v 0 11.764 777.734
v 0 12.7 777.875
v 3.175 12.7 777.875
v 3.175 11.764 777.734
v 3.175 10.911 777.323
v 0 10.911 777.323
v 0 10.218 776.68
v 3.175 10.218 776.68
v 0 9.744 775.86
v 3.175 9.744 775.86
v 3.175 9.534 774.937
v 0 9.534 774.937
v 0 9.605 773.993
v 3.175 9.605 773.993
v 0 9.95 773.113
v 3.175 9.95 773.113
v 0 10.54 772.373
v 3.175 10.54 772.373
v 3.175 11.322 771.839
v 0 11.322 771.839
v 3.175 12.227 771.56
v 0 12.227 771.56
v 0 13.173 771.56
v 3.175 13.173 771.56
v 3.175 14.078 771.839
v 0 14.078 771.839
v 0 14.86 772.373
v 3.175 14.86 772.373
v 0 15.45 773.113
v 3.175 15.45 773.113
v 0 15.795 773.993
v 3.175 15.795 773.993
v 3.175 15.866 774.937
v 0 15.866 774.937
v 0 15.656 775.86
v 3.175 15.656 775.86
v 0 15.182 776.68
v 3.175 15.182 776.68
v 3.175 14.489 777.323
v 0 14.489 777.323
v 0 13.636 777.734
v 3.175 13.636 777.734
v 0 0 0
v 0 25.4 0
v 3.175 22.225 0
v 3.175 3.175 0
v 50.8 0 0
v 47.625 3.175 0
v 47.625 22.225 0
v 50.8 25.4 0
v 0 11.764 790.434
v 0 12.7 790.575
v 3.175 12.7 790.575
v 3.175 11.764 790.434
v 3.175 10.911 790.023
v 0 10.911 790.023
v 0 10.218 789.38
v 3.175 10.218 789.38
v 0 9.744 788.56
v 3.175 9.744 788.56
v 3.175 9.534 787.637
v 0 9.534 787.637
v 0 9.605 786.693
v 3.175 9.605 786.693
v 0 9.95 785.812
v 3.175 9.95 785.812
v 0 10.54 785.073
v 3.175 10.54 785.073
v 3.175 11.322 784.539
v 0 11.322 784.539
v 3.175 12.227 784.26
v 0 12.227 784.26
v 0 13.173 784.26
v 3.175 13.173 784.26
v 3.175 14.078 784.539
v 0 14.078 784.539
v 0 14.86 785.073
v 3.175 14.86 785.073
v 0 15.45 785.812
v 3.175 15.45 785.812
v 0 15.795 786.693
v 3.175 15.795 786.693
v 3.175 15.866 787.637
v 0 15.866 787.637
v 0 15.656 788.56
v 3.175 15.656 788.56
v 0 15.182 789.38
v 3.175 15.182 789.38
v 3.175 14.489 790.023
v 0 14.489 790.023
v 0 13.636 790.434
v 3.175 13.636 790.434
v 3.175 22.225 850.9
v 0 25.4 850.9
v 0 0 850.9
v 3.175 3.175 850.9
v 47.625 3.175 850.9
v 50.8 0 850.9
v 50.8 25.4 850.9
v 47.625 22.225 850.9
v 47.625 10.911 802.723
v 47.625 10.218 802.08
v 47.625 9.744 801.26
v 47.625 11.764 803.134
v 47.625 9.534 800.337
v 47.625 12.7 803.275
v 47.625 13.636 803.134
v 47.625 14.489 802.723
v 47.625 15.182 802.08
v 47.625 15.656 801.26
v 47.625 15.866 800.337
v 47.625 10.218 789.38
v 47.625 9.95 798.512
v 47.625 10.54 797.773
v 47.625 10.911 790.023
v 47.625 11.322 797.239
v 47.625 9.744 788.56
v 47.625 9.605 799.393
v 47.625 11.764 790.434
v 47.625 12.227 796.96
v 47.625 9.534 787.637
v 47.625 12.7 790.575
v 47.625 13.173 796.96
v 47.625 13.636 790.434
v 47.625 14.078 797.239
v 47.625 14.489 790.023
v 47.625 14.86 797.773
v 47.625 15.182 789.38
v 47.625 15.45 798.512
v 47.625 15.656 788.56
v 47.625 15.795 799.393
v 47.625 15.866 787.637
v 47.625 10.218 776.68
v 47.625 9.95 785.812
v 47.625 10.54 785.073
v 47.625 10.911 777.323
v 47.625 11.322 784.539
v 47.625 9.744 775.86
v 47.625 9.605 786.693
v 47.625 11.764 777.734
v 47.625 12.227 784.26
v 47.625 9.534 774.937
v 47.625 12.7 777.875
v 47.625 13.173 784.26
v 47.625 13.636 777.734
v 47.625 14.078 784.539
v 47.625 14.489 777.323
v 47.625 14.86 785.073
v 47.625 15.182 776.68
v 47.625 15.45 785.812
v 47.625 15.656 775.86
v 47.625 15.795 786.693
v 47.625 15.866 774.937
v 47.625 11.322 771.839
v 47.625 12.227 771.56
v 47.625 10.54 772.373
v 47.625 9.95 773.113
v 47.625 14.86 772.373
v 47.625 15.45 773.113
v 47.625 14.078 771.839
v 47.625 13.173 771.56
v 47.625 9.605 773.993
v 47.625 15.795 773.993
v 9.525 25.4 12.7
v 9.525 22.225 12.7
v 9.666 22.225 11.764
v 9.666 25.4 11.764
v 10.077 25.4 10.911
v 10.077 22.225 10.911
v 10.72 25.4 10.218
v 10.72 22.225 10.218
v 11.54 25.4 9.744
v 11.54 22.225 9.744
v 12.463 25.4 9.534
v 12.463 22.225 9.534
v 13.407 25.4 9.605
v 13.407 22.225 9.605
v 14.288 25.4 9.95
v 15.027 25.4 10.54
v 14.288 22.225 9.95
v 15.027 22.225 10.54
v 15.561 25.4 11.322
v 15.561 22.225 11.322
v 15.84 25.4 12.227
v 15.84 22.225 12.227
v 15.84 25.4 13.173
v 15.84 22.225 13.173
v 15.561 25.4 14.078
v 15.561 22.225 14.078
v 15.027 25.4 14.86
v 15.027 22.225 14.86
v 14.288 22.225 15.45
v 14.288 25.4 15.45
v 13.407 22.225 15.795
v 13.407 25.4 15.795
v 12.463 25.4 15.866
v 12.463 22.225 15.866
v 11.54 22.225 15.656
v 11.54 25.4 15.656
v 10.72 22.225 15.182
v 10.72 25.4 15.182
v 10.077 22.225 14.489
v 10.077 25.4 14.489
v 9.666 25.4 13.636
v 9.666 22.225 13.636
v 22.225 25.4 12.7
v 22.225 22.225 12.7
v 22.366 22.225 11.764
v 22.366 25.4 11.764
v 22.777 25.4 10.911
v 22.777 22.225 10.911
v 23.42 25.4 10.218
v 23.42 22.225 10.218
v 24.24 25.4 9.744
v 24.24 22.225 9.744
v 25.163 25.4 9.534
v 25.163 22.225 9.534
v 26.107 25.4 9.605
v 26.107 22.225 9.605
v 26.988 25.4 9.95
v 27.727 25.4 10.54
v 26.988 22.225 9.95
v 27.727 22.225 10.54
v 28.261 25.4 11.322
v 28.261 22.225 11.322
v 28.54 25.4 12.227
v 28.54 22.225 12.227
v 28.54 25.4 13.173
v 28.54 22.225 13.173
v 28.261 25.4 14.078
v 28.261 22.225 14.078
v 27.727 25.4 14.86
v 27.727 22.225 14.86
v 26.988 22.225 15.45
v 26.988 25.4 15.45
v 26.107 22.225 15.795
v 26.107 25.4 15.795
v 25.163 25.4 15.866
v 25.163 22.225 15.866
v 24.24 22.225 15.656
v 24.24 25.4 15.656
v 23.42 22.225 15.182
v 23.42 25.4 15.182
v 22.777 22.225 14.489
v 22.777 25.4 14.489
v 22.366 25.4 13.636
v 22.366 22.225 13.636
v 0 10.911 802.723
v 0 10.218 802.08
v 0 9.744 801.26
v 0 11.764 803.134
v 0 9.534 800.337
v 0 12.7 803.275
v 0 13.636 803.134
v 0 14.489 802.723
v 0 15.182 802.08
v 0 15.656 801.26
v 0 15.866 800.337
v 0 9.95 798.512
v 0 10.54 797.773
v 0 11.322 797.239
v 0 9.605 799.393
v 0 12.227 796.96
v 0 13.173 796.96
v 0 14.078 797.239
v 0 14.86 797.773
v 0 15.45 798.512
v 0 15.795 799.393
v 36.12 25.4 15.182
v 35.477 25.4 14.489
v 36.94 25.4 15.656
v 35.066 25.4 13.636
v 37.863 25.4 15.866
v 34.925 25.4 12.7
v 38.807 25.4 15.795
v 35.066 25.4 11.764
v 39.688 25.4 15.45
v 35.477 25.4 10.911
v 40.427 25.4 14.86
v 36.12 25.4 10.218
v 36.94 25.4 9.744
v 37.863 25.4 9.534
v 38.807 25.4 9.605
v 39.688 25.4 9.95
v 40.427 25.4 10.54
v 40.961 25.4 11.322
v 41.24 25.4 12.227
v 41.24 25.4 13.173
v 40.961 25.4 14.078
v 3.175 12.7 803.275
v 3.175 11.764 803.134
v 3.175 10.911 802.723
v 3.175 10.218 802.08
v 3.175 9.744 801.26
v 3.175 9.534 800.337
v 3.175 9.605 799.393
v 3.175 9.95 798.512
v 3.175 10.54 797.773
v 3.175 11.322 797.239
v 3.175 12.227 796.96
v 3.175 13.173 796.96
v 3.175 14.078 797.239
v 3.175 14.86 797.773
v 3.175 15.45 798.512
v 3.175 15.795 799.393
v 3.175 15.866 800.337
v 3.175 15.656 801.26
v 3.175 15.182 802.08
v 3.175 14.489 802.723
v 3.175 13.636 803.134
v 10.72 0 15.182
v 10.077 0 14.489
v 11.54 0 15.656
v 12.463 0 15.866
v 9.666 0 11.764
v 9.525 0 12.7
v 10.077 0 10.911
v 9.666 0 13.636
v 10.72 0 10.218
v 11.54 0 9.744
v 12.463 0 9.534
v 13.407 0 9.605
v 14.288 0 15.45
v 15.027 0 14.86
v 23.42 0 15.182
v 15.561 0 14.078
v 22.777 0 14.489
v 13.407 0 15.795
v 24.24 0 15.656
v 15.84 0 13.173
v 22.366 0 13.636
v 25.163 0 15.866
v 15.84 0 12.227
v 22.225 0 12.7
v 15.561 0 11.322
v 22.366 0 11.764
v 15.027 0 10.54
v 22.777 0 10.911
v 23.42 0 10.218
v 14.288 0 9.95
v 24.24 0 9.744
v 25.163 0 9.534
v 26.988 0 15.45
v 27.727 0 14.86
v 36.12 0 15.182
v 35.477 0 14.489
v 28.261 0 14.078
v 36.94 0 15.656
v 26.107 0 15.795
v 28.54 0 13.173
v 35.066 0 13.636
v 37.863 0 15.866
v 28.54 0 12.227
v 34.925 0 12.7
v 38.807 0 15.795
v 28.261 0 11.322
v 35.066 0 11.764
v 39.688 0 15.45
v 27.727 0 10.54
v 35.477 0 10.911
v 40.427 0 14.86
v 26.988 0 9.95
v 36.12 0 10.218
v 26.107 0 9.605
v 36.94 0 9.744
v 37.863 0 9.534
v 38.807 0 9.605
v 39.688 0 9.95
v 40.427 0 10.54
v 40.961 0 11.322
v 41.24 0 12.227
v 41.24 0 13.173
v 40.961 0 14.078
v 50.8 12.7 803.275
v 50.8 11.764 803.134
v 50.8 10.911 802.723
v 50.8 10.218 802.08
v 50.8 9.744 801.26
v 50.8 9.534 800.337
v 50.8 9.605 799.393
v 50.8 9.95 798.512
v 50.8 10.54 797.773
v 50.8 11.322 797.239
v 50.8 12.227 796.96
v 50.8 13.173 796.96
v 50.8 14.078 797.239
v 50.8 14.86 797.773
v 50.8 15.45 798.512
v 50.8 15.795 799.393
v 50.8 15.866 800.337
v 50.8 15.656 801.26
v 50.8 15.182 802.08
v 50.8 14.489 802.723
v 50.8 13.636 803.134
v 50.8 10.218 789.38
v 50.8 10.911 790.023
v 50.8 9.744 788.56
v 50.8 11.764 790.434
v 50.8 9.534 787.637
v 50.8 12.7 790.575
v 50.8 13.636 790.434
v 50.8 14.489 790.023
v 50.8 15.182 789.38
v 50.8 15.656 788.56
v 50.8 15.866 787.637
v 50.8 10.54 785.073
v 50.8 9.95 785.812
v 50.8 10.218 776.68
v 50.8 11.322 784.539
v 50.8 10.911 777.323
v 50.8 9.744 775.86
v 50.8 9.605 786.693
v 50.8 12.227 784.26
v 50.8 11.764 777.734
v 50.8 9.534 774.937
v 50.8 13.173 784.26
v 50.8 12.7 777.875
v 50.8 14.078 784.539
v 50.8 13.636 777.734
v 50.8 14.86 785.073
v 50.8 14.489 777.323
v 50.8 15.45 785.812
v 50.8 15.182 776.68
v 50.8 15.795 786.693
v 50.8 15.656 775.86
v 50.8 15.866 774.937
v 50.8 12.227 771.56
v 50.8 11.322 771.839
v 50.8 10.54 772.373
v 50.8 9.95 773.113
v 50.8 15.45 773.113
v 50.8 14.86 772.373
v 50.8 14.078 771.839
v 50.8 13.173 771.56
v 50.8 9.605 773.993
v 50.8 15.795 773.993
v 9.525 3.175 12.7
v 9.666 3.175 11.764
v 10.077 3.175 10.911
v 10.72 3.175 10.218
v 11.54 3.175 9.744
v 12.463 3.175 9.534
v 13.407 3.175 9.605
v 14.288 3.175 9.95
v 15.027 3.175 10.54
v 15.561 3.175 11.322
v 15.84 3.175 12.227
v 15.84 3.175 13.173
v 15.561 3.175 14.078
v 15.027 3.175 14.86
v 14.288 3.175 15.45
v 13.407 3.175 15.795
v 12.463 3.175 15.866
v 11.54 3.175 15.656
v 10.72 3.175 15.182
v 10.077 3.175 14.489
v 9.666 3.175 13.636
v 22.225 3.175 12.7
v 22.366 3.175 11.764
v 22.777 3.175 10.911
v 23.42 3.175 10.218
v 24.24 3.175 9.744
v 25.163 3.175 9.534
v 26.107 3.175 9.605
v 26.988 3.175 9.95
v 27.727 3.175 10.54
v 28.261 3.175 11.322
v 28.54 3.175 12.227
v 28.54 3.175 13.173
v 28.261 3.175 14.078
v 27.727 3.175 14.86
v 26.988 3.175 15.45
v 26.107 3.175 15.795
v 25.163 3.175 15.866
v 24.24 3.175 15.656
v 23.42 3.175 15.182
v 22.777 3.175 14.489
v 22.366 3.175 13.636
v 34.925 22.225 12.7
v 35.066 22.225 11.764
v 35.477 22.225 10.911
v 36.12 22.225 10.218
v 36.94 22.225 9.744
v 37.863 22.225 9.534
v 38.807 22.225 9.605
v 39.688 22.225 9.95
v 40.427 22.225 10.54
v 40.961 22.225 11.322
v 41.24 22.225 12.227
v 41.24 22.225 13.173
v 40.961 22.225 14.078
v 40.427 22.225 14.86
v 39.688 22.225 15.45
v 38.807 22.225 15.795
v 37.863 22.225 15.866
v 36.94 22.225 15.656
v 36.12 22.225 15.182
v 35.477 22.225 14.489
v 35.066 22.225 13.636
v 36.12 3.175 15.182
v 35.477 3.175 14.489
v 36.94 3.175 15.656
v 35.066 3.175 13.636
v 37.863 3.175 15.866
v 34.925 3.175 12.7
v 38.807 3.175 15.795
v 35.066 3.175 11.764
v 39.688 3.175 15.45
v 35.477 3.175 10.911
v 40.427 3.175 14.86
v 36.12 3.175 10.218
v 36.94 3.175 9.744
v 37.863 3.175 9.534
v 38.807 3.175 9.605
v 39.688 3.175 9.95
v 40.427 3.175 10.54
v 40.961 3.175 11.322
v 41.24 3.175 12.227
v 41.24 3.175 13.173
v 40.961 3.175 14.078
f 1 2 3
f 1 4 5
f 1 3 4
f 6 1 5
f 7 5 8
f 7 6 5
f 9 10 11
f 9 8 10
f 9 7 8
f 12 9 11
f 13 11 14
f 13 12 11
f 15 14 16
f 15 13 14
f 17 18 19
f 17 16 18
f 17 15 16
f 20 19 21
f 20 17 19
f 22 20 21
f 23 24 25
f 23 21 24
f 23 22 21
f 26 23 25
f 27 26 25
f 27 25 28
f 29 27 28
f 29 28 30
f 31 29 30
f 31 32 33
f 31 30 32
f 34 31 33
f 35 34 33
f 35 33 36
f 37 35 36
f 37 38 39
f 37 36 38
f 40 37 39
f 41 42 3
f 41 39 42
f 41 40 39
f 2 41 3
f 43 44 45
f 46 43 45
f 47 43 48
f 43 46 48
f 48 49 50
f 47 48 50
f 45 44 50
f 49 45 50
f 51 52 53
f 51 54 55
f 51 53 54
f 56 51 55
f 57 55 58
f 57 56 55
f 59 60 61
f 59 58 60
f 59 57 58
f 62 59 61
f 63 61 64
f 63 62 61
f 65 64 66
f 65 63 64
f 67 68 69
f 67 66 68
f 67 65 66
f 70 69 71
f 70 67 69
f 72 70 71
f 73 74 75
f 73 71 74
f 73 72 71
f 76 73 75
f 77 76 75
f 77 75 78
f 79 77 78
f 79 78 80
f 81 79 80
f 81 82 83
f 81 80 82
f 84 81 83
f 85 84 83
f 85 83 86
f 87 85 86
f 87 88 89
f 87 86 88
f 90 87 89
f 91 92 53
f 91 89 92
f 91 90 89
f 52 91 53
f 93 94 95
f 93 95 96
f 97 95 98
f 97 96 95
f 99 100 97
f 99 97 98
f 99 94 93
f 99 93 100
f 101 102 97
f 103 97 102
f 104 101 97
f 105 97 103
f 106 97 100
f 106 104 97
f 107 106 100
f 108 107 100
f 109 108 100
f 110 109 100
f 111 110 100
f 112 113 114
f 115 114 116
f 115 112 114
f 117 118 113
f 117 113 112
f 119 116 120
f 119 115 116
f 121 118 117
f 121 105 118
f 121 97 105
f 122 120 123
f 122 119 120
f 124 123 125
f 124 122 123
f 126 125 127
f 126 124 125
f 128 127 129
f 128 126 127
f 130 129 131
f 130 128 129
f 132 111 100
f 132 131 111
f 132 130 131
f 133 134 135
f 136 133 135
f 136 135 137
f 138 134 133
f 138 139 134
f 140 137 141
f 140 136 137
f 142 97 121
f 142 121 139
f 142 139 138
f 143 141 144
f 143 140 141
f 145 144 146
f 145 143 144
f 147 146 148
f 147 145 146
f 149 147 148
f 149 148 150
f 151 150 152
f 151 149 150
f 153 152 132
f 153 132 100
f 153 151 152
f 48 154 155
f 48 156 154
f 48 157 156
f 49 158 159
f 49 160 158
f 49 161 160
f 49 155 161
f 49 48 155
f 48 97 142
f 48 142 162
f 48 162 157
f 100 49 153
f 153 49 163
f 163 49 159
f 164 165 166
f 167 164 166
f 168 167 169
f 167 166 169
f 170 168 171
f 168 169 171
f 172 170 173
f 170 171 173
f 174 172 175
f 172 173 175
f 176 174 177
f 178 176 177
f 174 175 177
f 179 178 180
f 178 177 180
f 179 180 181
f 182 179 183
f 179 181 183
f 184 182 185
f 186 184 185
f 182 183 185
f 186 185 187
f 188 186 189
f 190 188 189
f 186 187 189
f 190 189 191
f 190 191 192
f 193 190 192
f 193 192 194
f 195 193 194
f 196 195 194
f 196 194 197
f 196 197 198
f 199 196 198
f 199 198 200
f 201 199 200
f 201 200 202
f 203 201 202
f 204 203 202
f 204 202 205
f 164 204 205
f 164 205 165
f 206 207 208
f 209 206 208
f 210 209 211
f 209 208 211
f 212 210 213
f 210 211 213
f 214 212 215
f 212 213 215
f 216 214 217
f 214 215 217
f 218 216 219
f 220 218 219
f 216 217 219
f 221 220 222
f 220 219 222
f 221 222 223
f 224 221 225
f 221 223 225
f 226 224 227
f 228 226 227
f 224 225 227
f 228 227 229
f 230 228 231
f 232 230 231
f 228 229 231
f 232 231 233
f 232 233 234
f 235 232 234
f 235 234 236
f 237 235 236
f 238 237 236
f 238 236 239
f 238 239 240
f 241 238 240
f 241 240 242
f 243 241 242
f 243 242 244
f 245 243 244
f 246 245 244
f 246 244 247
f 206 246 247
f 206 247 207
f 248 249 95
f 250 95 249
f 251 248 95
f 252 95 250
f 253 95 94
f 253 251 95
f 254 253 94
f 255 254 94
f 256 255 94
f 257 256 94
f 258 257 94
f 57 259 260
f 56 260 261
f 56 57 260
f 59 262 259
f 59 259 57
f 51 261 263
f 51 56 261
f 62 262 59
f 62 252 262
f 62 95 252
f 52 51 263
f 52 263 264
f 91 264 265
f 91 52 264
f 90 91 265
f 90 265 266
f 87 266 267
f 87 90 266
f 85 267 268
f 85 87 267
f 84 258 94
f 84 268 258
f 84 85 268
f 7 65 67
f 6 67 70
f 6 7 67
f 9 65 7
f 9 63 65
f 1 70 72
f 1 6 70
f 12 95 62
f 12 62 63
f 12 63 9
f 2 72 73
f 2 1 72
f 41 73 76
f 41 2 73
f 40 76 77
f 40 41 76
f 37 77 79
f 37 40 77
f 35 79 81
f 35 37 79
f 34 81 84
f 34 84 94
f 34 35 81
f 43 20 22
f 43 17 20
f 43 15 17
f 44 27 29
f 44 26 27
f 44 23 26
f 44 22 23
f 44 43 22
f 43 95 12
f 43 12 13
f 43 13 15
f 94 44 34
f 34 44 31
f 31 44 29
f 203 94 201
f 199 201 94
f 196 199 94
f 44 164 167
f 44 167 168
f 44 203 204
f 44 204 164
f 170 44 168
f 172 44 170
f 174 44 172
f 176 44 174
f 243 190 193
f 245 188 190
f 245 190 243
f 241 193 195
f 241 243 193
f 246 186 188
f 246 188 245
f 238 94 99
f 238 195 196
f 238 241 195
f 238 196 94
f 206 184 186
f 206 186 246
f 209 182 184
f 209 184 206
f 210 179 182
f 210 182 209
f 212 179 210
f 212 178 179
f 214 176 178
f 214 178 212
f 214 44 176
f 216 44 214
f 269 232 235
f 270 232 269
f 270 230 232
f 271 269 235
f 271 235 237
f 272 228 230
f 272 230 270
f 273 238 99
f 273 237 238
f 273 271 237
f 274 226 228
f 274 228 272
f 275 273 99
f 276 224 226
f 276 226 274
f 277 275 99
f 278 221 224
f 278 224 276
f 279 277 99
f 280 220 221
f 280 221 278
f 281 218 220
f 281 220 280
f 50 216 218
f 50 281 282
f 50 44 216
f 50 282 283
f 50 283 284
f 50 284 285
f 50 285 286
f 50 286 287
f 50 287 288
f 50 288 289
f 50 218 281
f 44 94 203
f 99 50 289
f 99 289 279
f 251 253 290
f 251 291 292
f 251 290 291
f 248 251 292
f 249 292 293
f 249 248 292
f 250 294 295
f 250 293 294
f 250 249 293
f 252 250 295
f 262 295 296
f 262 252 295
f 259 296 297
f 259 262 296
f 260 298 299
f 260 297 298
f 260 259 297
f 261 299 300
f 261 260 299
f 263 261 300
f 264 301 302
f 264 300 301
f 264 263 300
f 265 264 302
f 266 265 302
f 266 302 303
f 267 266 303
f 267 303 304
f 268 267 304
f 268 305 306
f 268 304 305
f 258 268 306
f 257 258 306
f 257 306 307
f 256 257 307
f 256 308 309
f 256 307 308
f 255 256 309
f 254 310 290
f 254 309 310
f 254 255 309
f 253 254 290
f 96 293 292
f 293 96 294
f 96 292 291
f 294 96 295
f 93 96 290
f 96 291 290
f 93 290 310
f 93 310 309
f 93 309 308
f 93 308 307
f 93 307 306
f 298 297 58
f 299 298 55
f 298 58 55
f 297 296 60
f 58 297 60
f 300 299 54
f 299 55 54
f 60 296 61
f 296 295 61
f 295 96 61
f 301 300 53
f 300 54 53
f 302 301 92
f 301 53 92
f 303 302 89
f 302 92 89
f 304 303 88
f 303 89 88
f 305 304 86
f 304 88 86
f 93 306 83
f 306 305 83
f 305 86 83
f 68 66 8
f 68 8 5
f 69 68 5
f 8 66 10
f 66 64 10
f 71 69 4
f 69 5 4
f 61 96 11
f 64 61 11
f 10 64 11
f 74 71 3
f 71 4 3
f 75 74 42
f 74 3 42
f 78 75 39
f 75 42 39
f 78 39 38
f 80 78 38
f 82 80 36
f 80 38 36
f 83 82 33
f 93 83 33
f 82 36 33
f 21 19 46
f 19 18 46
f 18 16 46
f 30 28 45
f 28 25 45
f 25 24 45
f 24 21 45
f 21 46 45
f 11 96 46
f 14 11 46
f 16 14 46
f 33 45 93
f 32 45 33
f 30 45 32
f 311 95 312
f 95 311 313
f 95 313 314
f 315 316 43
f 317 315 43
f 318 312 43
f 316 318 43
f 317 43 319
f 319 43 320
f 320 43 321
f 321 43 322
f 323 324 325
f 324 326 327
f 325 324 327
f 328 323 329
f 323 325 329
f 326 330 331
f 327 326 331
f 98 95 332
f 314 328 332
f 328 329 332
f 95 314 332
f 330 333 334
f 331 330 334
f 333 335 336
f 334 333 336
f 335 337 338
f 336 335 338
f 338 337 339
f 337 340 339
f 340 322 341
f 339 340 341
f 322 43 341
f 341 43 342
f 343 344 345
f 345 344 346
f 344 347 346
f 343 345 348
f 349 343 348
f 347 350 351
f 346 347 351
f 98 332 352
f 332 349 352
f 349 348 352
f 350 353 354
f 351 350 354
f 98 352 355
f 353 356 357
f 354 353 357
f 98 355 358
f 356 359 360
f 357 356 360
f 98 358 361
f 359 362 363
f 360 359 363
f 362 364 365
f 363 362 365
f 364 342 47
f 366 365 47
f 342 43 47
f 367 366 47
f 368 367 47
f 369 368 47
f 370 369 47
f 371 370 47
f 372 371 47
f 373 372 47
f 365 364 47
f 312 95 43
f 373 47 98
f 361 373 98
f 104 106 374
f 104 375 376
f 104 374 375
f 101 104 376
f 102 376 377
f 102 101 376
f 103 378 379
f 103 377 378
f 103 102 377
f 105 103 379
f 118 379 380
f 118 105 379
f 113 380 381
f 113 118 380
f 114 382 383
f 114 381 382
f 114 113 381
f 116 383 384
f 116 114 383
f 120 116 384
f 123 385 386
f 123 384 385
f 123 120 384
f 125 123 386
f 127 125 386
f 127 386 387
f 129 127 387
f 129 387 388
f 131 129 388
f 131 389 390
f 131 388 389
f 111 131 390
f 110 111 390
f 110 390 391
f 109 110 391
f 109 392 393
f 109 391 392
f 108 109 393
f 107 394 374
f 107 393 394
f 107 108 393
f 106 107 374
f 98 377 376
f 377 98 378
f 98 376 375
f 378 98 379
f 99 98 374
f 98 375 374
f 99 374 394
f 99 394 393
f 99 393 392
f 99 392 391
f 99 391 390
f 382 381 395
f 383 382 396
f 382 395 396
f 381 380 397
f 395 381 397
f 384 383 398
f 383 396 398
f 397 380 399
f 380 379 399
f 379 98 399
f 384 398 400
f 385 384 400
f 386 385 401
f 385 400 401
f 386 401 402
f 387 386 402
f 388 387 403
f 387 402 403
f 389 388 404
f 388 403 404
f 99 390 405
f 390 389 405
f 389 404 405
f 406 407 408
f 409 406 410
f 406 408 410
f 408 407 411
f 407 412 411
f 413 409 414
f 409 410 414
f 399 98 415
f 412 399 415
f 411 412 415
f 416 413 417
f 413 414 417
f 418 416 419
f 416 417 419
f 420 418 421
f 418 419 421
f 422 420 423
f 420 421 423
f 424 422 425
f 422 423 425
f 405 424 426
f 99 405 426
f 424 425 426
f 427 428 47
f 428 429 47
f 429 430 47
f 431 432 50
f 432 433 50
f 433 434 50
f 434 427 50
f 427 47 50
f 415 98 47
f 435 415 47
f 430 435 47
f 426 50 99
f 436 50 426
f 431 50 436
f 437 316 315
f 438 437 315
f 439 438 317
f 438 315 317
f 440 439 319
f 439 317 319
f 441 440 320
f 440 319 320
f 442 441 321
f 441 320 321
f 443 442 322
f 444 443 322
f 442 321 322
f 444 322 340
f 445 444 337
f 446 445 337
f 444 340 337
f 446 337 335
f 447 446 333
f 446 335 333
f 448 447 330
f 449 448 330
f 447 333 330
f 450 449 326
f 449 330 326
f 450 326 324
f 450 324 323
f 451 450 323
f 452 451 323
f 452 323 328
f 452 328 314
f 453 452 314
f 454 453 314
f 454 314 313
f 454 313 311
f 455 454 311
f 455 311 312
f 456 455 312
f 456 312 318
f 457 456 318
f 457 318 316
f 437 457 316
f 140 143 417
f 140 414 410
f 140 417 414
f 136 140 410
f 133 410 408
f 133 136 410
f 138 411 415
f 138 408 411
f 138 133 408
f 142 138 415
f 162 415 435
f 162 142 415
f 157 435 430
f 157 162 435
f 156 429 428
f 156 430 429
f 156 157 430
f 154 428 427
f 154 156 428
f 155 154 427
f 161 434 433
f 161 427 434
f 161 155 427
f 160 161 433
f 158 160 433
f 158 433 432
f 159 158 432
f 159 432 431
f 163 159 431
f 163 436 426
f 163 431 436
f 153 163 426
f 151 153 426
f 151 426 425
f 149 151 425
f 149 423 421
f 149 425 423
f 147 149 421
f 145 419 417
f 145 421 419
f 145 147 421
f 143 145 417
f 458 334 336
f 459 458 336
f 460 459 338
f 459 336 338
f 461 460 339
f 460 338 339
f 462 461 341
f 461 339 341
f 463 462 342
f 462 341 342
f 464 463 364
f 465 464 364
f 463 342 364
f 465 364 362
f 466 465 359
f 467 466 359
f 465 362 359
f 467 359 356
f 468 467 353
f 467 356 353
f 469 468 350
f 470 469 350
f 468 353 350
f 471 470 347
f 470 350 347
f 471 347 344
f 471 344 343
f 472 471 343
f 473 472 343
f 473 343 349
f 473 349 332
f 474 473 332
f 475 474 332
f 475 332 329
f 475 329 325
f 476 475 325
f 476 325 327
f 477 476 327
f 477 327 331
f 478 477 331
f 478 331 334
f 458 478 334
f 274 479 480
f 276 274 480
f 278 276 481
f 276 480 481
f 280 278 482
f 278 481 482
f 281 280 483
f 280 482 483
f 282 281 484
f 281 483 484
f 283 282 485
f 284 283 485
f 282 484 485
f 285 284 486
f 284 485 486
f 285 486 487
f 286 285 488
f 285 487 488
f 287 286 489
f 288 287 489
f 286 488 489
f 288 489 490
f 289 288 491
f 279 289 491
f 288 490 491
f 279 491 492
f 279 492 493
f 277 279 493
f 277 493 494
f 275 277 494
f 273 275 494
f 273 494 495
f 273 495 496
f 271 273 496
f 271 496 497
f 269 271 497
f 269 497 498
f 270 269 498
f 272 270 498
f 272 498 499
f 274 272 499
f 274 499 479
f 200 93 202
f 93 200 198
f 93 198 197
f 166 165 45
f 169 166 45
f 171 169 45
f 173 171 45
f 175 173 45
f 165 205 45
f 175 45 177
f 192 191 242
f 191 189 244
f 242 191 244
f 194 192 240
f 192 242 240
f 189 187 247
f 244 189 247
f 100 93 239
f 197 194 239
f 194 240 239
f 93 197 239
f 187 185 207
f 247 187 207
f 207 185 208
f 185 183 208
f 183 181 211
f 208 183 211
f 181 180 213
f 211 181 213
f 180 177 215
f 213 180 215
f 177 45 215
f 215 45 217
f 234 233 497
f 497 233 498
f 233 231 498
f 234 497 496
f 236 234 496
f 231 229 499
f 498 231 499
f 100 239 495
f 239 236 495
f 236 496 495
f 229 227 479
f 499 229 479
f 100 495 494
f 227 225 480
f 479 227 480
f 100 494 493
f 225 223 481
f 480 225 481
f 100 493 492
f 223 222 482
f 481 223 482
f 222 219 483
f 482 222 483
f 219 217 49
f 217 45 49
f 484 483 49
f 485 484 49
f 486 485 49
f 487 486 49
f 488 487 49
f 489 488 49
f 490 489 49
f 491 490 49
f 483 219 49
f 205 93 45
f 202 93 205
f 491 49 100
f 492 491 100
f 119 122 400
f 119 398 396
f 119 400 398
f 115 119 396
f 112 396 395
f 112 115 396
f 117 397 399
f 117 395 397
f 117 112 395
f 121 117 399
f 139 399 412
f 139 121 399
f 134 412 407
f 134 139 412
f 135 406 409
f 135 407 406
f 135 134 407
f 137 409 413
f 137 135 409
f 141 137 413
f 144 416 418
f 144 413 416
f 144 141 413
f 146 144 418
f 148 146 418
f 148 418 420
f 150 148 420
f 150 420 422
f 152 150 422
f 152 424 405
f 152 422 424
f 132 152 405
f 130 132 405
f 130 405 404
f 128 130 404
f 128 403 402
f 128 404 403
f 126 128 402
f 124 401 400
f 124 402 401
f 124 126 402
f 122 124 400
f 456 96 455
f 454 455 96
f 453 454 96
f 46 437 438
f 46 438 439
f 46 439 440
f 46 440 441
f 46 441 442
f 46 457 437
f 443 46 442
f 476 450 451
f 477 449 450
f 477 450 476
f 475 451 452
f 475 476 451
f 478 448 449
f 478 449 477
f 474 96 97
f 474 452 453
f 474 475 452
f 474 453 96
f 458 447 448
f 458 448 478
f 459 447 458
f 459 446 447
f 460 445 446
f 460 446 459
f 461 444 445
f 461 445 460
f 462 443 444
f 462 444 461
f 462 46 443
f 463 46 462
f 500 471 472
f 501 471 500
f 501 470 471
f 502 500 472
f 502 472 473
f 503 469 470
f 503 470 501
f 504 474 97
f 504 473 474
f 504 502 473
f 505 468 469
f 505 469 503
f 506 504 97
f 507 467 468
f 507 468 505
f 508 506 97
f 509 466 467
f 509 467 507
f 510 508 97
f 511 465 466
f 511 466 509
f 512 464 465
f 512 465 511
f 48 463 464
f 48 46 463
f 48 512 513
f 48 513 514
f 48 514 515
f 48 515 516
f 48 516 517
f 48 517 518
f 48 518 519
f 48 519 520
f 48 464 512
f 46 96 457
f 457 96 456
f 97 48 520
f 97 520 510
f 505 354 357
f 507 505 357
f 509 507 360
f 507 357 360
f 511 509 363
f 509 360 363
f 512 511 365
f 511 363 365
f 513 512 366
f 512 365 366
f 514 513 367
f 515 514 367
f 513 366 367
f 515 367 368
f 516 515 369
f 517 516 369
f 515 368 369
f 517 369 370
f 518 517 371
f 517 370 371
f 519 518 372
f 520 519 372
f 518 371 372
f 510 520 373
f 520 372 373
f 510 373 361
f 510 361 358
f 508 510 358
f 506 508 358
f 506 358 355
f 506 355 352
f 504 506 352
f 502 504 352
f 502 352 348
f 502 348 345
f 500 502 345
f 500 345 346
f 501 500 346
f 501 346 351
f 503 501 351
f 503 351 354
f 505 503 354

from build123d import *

# Parameters (mm, degrees)
SKETCH1_W                   = 50.8
SKETCH1_H                   = 25.4
SKETCH1_W_2                 = 44.45
SKETCH1_H_2                 = 19.05
BOSS_EXTRUDE1_DEPTH         = 850.9
CUT_EXTRUDE1_DEPTH          = 853.793415781
CUT_EXTRUDE1_DEPTH_BACK     = 853.793415781
SKETCH2_R                   = 3.175
F_1_4_0_25_DIAMETER_HOLE3_D = 6.35


with BuildPart() as part:
    # Sketch1 → Boss-Extrude1 (new body)
    with BuildSketch(Plane.XY):
        with Locations((25.4, 12.7)):
            Rectangle(SKETCH1_W, SKETCH1_H)
        with Locations((25.4, 12.7)):
            Rectangle(SKETCH1_W_2, SKETCH1_H_2, mode=Mode.SUBTRACT)
    extrude(amount=BOSS_EXTRUDE1_DEPTH)

    # Sketch2 → Cut-Extrude1 (cut, two sides: drawn at the far end of the back side and taken through both)
    with BuildSketch(Plane(origin=(50.8, 0, 0), x_dir=(0, 0, -1), z_dir=(1, 0, 0)).offset(-CUT_EXTRUDE1_DEPTH_BACK)):
        with Locations(Location((-800.1, 12.7, 0), (0, 0, 180))):
            Circle(SKETCH2_R)
        with Locations(Location((-787.4, 12.7, 0), (0, 0, 180))):
            Circle(SKETCH2_R)
        with Locations(Location((-774.7, 12.7, 0), (0, 0, 180))):
            Circle(SKETCH2_R)
    extrude(amount=CUT_EXTRUDE1_DEPTH + CUT_EXTRUDE1_DEPTH_BACK, mode=Mode.SUBTRACT)

    # 1/4 (0.25) Diameter Hole3 (through all)
    with Locations(Plane(origin=(0, 25.4, 0), x_dir=(1, 0, 0), z_dir=(0, 1, 0))):
        with Locations((12.7, -12.7), (25.4, -12.7), (38.1, -12.7)):
            Hole(F_1_4_0_25_DIAMETER_HOLE3_D / 2)


solid = part.part
